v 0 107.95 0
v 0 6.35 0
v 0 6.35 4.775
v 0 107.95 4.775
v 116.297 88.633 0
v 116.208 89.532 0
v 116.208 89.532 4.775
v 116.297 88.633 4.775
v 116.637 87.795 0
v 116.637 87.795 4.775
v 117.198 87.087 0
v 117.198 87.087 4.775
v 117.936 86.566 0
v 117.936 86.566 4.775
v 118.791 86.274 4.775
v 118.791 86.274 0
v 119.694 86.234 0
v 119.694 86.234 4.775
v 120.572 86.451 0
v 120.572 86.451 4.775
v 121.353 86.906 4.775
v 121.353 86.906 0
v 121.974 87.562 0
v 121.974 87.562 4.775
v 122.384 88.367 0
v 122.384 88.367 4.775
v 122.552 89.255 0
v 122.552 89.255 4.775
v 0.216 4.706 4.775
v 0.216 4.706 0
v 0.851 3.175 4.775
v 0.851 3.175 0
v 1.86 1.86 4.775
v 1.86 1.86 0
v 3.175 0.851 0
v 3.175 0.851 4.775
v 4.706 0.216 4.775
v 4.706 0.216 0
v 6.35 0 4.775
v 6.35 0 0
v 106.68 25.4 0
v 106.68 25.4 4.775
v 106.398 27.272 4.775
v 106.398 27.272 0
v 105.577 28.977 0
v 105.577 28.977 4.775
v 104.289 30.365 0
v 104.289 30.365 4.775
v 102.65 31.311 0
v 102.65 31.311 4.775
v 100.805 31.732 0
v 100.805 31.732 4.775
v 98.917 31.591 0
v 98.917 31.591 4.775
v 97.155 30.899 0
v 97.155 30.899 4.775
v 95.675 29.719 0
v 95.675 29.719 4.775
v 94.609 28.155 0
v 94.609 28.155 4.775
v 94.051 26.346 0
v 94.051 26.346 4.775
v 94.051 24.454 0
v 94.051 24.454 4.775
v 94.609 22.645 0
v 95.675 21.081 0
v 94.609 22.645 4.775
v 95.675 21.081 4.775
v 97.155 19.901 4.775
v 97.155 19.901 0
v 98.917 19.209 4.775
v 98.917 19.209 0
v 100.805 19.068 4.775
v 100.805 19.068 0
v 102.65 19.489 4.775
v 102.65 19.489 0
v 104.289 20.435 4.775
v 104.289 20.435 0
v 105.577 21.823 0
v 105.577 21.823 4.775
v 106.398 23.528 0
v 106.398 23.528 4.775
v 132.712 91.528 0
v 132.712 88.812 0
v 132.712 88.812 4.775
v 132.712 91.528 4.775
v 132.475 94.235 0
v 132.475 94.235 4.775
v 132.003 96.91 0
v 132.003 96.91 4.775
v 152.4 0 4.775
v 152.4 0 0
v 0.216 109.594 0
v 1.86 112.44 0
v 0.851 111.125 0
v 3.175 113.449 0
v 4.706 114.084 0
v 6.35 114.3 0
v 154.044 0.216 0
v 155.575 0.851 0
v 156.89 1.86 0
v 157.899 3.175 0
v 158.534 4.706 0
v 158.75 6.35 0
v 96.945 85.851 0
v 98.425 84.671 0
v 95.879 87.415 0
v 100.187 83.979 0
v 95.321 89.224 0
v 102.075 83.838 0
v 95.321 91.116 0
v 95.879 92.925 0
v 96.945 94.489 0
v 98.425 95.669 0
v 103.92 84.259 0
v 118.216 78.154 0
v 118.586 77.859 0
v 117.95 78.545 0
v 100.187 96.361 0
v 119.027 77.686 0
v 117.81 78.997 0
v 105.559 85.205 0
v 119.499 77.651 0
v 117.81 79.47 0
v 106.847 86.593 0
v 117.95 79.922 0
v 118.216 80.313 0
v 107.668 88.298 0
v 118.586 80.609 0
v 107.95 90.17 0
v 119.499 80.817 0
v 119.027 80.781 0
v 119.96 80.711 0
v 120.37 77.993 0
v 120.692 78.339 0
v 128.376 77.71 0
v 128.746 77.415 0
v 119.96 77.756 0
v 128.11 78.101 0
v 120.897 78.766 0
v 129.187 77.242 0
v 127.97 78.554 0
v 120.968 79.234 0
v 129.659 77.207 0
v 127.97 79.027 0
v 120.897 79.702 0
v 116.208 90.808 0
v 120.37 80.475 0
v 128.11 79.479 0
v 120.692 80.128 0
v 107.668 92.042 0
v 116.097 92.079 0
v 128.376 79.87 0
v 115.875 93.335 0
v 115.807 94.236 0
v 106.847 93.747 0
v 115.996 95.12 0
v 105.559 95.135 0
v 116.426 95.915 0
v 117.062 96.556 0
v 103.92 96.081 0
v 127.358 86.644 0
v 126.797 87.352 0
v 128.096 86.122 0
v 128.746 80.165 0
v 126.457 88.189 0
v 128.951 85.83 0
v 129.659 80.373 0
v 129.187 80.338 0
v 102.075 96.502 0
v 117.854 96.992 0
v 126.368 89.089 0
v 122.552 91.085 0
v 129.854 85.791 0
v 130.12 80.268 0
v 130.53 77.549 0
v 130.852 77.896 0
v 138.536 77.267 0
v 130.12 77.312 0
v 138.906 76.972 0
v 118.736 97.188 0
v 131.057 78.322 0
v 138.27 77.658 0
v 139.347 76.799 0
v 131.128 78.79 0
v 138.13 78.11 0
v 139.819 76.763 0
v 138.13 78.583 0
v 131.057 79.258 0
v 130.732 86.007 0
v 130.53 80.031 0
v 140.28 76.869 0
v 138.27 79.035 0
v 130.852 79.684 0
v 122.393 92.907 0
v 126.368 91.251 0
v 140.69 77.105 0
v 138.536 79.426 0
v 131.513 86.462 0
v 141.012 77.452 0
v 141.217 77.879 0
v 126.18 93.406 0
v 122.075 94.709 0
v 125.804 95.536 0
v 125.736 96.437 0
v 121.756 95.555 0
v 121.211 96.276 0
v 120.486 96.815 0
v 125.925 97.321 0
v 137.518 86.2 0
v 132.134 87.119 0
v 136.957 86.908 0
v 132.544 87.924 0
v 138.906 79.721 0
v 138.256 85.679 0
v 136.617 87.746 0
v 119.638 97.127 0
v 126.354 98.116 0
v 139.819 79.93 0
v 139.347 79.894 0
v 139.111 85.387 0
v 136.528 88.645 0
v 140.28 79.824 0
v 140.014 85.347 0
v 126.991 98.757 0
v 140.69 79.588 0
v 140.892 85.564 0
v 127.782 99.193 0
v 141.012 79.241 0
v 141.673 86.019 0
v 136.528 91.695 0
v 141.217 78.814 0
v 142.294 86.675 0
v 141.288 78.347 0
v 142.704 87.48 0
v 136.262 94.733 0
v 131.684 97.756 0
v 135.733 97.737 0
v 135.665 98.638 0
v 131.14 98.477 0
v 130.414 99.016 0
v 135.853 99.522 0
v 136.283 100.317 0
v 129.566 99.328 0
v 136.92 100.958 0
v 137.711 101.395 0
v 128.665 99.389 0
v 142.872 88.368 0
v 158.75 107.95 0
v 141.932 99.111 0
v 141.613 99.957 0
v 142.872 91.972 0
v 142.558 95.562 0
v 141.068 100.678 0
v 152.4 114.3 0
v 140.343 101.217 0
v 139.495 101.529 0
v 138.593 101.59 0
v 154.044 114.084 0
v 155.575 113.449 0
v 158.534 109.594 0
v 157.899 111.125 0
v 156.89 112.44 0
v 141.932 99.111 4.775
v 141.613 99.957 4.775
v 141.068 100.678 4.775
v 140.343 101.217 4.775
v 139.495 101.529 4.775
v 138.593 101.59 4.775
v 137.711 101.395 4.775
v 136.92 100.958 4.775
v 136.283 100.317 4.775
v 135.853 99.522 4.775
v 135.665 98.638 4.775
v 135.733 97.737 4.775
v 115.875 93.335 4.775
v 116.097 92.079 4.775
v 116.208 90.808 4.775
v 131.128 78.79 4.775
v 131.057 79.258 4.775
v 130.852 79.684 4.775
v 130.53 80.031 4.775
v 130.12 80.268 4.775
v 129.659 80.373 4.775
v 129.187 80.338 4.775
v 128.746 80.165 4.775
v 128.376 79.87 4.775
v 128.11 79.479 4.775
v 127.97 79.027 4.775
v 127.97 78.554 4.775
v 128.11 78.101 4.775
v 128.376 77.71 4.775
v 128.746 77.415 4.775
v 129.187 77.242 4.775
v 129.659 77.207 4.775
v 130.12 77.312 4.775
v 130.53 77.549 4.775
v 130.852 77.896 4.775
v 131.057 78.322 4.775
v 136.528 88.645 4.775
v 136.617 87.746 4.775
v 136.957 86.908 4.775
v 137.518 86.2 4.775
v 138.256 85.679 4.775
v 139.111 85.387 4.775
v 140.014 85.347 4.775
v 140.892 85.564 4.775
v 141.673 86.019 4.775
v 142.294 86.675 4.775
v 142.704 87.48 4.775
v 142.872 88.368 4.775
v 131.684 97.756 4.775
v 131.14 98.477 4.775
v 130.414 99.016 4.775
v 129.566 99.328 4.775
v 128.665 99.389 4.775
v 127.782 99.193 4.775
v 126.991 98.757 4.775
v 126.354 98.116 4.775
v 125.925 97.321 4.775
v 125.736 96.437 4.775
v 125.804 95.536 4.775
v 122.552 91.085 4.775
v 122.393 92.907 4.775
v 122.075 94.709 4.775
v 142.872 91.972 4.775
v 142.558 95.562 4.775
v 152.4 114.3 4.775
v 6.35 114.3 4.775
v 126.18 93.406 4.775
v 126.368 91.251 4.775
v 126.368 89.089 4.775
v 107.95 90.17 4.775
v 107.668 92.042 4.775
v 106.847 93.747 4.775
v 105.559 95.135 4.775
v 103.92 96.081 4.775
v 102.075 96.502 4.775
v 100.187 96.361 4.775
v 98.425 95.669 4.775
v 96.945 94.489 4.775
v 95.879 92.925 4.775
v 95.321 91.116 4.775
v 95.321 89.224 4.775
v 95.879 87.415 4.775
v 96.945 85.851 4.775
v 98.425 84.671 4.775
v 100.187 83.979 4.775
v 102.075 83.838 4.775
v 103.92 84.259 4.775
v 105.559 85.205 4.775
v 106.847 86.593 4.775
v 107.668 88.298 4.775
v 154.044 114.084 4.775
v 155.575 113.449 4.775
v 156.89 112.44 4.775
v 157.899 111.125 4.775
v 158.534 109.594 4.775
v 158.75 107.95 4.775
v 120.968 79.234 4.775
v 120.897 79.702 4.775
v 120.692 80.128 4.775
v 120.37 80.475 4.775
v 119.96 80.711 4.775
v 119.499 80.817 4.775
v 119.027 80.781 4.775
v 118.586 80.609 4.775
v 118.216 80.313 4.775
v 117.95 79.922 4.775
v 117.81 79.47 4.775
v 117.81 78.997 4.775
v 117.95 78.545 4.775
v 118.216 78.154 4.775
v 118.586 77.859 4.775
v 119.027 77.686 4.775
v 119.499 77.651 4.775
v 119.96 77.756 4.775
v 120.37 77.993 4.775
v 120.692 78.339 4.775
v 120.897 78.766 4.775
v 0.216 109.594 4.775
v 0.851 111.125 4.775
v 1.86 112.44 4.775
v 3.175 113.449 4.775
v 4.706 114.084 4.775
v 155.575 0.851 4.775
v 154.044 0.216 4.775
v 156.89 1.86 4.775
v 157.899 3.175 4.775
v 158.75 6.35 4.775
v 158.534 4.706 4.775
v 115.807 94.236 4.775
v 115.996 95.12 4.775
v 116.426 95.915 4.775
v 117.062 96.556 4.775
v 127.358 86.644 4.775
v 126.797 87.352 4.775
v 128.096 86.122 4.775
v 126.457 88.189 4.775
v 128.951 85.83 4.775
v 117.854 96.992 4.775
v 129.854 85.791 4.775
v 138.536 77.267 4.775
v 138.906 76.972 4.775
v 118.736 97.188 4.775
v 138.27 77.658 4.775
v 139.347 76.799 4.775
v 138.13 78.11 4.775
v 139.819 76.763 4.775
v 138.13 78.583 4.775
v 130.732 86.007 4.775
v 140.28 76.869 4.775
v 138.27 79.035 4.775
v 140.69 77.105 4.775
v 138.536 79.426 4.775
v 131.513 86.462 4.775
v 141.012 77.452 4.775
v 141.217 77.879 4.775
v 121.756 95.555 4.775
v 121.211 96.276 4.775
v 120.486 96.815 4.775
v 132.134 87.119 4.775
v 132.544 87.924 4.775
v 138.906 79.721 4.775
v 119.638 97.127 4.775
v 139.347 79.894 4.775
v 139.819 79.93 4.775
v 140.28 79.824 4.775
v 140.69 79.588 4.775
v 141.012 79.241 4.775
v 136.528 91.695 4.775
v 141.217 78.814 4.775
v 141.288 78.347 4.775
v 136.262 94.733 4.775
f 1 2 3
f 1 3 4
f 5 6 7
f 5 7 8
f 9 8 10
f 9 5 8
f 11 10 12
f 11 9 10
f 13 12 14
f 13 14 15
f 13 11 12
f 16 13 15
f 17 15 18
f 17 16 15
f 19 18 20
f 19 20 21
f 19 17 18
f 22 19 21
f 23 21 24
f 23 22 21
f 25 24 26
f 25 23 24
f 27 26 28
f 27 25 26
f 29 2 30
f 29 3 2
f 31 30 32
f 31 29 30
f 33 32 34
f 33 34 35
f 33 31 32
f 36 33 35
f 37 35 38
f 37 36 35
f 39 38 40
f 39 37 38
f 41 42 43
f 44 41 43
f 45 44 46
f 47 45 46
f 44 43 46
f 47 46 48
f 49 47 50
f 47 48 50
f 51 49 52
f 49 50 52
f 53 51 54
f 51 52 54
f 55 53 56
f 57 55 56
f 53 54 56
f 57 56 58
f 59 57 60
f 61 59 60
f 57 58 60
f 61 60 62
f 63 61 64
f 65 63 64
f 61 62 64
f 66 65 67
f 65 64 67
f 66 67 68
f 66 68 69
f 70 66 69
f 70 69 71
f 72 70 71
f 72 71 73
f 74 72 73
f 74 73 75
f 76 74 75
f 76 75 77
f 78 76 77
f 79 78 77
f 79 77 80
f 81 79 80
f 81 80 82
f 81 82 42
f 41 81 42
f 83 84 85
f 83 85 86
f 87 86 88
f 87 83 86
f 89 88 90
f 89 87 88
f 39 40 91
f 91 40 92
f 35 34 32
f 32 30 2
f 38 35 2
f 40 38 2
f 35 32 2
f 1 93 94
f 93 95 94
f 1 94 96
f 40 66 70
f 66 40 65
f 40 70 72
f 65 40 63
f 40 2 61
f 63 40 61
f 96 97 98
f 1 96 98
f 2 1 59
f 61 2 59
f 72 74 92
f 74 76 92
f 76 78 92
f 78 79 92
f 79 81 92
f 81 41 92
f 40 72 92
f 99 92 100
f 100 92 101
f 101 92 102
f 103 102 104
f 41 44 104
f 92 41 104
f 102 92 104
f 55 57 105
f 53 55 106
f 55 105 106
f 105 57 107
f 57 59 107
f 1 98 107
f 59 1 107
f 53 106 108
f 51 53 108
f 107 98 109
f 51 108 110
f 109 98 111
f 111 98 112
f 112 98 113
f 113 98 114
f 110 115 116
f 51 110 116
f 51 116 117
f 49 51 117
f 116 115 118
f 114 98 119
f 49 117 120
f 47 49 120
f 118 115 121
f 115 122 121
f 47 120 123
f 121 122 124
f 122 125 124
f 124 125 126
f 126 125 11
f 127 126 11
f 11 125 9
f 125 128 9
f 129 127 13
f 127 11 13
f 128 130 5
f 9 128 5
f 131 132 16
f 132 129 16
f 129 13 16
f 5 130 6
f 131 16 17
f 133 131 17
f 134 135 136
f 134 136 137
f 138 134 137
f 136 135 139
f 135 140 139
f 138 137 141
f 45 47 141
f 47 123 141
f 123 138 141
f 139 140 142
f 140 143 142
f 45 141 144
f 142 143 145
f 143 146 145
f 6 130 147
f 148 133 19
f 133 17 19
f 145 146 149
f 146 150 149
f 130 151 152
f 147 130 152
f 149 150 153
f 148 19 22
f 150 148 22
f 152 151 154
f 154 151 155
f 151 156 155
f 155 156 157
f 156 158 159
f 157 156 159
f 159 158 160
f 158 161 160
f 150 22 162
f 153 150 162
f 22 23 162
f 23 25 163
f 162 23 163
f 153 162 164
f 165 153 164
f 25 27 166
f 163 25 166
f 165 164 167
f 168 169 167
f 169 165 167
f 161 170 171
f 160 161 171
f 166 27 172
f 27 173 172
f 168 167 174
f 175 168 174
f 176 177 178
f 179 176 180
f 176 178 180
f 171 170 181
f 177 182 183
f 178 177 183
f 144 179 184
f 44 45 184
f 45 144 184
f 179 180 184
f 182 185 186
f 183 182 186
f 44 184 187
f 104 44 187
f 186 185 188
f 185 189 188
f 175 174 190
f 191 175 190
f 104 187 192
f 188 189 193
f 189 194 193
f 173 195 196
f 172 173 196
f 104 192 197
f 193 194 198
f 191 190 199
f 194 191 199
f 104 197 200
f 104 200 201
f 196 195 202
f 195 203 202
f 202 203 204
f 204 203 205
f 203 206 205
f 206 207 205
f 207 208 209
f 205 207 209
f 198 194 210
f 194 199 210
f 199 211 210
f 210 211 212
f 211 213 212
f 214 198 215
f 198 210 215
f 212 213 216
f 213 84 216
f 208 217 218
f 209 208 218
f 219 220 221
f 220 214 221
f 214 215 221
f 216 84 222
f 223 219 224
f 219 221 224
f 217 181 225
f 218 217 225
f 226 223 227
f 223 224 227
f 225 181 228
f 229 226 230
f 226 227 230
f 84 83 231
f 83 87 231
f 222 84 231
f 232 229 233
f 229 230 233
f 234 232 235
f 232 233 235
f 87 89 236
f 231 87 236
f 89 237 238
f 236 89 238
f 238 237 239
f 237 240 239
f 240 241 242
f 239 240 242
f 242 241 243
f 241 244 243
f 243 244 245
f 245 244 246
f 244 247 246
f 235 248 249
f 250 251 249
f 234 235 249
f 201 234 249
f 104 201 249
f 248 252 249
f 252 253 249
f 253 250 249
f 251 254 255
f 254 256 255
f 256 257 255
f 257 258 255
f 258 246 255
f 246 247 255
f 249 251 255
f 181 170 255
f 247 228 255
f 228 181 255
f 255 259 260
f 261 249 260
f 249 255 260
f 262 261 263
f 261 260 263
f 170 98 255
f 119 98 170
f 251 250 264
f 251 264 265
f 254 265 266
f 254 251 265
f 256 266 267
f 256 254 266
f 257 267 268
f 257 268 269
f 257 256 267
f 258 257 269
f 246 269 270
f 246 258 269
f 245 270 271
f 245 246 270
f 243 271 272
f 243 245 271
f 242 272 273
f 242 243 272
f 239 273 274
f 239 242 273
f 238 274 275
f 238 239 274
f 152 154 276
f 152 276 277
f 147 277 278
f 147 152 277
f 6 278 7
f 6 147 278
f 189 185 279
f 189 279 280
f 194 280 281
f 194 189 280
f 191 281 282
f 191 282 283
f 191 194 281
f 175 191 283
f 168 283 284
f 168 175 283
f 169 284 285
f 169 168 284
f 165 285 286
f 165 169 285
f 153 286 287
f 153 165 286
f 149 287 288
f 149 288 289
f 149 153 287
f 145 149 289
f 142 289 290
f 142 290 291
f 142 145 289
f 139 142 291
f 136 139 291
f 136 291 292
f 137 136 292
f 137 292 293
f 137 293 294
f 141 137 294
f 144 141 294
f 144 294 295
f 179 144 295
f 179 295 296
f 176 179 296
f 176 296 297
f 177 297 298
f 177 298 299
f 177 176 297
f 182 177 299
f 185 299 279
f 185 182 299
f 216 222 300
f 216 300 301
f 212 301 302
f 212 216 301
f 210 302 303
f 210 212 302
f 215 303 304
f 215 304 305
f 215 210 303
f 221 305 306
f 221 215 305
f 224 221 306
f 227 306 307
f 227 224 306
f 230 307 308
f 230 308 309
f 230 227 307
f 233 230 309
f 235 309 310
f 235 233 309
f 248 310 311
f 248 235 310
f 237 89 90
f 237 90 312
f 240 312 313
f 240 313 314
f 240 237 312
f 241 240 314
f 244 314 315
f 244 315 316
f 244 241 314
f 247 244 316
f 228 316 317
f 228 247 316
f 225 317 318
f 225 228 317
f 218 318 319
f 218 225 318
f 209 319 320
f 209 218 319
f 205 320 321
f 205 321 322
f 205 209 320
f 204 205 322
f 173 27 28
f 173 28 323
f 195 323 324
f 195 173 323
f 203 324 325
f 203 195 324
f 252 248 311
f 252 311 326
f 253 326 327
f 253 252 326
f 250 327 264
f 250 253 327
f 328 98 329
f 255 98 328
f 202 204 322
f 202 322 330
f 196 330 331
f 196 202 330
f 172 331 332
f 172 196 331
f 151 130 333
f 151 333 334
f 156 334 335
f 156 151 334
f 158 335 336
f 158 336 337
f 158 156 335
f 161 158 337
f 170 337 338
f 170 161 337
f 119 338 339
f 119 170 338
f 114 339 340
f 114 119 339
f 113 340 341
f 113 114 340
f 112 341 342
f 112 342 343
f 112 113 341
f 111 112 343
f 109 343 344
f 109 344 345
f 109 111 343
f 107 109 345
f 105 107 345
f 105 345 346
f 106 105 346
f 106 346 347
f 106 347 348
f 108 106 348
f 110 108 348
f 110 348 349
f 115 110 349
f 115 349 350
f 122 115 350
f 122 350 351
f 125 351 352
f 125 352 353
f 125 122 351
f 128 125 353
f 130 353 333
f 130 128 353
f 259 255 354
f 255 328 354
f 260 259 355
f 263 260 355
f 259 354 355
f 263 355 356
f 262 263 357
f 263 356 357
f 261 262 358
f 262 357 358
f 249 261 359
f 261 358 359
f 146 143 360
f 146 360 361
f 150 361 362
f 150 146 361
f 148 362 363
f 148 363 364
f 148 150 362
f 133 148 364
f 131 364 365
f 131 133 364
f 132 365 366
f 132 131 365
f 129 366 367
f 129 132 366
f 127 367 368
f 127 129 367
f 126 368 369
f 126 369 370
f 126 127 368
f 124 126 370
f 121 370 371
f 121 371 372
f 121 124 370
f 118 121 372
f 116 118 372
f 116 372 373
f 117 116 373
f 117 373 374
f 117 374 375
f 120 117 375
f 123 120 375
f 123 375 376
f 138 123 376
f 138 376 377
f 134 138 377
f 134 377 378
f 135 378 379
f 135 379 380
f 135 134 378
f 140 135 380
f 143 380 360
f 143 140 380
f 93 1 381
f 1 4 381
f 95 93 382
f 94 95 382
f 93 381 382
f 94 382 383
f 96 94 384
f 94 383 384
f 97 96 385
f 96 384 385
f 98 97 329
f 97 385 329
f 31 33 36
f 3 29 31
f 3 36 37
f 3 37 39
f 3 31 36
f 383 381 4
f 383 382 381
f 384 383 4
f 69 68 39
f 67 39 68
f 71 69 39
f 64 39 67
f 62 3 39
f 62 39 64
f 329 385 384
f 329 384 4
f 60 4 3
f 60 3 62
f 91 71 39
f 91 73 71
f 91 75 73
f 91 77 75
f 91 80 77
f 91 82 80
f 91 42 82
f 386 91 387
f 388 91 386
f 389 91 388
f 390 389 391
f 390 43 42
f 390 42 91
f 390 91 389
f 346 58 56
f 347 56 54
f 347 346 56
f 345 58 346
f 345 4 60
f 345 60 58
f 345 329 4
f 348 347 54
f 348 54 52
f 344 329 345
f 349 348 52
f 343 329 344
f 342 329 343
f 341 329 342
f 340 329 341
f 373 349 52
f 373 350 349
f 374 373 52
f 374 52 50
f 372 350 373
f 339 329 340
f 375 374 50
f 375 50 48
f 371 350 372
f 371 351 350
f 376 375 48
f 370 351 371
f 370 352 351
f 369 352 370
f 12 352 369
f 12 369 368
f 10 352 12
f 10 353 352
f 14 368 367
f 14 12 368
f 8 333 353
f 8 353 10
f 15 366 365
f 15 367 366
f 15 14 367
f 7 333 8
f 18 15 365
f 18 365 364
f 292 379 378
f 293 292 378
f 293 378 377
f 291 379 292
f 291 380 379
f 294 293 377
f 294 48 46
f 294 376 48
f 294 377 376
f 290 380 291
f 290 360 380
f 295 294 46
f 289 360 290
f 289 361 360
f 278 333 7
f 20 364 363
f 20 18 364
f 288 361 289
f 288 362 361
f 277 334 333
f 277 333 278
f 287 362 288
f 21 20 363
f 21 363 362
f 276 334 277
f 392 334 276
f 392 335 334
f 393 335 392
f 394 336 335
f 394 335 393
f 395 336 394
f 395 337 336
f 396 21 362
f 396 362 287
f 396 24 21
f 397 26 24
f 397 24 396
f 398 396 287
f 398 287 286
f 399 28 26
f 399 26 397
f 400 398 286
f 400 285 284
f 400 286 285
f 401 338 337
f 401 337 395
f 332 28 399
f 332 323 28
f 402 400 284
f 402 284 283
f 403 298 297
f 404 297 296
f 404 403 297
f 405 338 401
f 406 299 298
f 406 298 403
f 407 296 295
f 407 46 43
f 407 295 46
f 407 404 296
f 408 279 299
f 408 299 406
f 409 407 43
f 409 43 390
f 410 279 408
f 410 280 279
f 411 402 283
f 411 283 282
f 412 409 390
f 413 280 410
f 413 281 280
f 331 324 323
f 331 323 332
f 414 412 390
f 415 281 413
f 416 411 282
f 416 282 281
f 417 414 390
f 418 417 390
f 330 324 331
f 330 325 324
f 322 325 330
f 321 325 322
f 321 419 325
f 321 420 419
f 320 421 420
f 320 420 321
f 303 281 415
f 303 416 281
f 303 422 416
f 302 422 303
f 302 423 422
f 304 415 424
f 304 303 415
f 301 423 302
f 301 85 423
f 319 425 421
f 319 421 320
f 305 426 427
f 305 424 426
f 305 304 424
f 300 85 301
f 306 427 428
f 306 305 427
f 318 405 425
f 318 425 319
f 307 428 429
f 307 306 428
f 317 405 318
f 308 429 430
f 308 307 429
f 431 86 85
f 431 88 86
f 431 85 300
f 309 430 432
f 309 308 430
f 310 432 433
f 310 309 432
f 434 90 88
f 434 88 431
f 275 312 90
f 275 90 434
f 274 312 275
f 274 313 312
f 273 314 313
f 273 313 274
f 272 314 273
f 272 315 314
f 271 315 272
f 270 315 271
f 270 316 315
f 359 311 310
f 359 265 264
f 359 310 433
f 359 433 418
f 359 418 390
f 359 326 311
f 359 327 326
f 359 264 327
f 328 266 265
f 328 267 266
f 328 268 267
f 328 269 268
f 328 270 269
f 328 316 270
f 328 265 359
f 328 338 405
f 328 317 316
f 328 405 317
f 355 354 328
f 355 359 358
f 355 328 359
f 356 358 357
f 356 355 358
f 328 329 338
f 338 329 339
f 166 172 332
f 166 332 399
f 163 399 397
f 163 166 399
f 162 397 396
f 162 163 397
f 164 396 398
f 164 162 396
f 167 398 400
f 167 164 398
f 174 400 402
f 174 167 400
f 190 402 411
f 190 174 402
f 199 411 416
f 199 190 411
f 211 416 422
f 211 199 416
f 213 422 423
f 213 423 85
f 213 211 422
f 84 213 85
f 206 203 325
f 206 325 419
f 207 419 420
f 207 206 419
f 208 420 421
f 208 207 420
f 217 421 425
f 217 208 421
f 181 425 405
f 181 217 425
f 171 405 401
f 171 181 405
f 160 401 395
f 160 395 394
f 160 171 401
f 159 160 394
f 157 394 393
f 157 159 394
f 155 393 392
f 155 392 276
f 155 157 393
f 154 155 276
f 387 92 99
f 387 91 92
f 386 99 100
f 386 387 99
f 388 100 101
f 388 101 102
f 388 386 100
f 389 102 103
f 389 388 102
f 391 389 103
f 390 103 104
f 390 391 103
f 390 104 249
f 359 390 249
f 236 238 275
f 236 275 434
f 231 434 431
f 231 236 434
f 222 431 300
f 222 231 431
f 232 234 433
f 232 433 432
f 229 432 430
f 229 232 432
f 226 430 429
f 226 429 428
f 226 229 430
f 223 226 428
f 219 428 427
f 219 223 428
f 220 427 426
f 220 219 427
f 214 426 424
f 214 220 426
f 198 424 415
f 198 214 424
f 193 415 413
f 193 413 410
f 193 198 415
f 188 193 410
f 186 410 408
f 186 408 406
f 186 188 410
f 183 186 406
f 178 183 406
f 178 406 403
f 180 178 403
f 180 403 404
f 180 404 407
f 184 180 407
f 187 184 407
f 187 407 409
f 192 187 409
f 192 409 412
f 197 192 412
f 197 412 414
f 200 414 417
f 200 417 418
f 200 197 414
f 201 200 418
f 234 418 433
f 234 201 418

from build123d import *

# Parameters (mm, degrees)
SKETCH1_W           = 158.75
SKETCH1_H           = 114.3
SKETCH1_R           = 6.35
SKETCH1_R_2         = 1.5875
BOSS_EXTRUDE1_DEPTH = 4.7752
FILLET2_R           = 6.35
SKETCH2_R           = 6.35
CUT_EXTRUDE1_DEPTH  = 20.32


with BuildPart() as part:
    # Sketch1 → Boss-Extrude1 (new body)
    with BuildSketch(Plane.XY):
        with Locations((79.375, 57.15)):
            Rectangle(SKETCH1_W, SKETCH1_H)
        with Locations((101.6, 90.17)):
            Circle(SKETCH1_R, mode=Mode.SUBTRACT)
        with Locations((119.38, 79.233708435)):
            Circle(SKETCH1_R_2, mode=Mode.SUBTRACT)
        with Locations((129.54, 78.790113255)):
            Circle(SKETCH1_R_2, mode=Mode.SUBTRACT)
        with Locations((139.7, 78.346518075)):
            Circle(SKETCH1_R_2, mode=Mode.SUBTRACT)
        with BuildLine():
            ThreePointArc((122.551978104, 89.25521688), (122.492134184, 91.997824898), (122.074820056, 94.709158325))
            ThreePointArc((122.074820056, 94.709158325), (118.287884459, 97.121702373), (115.87534041, 93.334766776))
            ThreePointArc((115.87534041, 93.334766776), (116.166297851, 91.444385931), (116.208021896, 89.53219999))
            ThreePointArc((116.208021896, 89.53219999), (119.241508445, 86.221730332), (122.551978104, 89.25521688))
        make_face(mode=Mode.SUBTRACT)
        with BuildLine():
            ThreePointArc((142.871978104, 88.36802652), (142.754095346, 93.7705168), (141.932054608, 99.11140124))
            ThreePointArc((141.932054608, 99.11140124), (138.145119011, 101.523945288), (135.732574962, 97.737009691))
            ThreePointArc((135.732574962, 97.737009691), (136.428259013, 93.217077834), (136.528021896, 88.64500963))
            ThreePointArc((136.528021896, 88.64500963), (139.561508445, 85.334539972), (142.871978104, 88.36802652))
        make_face(mode=Mode.SUBTRACT)
        with BuildLine():
            ThreePointArc((132.711978104, 88.8116217), (132.623114765, 92.884170849), (132.003437332, 96.910279782))
            ThreePointArc((132.003437332, 96.910279782), (128.216501735, 99.322823831), (125.803957686, 95.535888234))
            ThreePointArc((125.803957686, 95.535888234), (126.297278432, 92.330731883), (126.368021896, 89.08860481))
            ThreePointArc((126.368021896, 89.08860481), (129.401508445, 85.778135152), (132.711978104, 88.8116217))
        make_face(mode=Mode.SUBTRACT)
    extrude(amount=BOSS_EXTRUDE1_DEPTH)

    # Fillet2
    fillet2_edges = [part.edges().sort_by_distance(p)[0] for p in [
        (0, 114.3, 2.3876),
        (158.75, 114.3, 2.3876),
        (158.75, 0, 2.3876),
        (0, 0, 2.3876),
    ]]
    fillet(fillet2_edges, radius=FILLET2_R)

    # Sketch2 → Cut-Extrude1 (cut)
    with BuildSketch(Plane.XY.offset(4.7752)):
        with Locations((100.33, 25.4)):
            Circle(SKETCH2_R)
    extrude(amount=-CUT_EXTRUDE1_DEPTH, mode=Mode.SUBTRACT)


solid = part.part
